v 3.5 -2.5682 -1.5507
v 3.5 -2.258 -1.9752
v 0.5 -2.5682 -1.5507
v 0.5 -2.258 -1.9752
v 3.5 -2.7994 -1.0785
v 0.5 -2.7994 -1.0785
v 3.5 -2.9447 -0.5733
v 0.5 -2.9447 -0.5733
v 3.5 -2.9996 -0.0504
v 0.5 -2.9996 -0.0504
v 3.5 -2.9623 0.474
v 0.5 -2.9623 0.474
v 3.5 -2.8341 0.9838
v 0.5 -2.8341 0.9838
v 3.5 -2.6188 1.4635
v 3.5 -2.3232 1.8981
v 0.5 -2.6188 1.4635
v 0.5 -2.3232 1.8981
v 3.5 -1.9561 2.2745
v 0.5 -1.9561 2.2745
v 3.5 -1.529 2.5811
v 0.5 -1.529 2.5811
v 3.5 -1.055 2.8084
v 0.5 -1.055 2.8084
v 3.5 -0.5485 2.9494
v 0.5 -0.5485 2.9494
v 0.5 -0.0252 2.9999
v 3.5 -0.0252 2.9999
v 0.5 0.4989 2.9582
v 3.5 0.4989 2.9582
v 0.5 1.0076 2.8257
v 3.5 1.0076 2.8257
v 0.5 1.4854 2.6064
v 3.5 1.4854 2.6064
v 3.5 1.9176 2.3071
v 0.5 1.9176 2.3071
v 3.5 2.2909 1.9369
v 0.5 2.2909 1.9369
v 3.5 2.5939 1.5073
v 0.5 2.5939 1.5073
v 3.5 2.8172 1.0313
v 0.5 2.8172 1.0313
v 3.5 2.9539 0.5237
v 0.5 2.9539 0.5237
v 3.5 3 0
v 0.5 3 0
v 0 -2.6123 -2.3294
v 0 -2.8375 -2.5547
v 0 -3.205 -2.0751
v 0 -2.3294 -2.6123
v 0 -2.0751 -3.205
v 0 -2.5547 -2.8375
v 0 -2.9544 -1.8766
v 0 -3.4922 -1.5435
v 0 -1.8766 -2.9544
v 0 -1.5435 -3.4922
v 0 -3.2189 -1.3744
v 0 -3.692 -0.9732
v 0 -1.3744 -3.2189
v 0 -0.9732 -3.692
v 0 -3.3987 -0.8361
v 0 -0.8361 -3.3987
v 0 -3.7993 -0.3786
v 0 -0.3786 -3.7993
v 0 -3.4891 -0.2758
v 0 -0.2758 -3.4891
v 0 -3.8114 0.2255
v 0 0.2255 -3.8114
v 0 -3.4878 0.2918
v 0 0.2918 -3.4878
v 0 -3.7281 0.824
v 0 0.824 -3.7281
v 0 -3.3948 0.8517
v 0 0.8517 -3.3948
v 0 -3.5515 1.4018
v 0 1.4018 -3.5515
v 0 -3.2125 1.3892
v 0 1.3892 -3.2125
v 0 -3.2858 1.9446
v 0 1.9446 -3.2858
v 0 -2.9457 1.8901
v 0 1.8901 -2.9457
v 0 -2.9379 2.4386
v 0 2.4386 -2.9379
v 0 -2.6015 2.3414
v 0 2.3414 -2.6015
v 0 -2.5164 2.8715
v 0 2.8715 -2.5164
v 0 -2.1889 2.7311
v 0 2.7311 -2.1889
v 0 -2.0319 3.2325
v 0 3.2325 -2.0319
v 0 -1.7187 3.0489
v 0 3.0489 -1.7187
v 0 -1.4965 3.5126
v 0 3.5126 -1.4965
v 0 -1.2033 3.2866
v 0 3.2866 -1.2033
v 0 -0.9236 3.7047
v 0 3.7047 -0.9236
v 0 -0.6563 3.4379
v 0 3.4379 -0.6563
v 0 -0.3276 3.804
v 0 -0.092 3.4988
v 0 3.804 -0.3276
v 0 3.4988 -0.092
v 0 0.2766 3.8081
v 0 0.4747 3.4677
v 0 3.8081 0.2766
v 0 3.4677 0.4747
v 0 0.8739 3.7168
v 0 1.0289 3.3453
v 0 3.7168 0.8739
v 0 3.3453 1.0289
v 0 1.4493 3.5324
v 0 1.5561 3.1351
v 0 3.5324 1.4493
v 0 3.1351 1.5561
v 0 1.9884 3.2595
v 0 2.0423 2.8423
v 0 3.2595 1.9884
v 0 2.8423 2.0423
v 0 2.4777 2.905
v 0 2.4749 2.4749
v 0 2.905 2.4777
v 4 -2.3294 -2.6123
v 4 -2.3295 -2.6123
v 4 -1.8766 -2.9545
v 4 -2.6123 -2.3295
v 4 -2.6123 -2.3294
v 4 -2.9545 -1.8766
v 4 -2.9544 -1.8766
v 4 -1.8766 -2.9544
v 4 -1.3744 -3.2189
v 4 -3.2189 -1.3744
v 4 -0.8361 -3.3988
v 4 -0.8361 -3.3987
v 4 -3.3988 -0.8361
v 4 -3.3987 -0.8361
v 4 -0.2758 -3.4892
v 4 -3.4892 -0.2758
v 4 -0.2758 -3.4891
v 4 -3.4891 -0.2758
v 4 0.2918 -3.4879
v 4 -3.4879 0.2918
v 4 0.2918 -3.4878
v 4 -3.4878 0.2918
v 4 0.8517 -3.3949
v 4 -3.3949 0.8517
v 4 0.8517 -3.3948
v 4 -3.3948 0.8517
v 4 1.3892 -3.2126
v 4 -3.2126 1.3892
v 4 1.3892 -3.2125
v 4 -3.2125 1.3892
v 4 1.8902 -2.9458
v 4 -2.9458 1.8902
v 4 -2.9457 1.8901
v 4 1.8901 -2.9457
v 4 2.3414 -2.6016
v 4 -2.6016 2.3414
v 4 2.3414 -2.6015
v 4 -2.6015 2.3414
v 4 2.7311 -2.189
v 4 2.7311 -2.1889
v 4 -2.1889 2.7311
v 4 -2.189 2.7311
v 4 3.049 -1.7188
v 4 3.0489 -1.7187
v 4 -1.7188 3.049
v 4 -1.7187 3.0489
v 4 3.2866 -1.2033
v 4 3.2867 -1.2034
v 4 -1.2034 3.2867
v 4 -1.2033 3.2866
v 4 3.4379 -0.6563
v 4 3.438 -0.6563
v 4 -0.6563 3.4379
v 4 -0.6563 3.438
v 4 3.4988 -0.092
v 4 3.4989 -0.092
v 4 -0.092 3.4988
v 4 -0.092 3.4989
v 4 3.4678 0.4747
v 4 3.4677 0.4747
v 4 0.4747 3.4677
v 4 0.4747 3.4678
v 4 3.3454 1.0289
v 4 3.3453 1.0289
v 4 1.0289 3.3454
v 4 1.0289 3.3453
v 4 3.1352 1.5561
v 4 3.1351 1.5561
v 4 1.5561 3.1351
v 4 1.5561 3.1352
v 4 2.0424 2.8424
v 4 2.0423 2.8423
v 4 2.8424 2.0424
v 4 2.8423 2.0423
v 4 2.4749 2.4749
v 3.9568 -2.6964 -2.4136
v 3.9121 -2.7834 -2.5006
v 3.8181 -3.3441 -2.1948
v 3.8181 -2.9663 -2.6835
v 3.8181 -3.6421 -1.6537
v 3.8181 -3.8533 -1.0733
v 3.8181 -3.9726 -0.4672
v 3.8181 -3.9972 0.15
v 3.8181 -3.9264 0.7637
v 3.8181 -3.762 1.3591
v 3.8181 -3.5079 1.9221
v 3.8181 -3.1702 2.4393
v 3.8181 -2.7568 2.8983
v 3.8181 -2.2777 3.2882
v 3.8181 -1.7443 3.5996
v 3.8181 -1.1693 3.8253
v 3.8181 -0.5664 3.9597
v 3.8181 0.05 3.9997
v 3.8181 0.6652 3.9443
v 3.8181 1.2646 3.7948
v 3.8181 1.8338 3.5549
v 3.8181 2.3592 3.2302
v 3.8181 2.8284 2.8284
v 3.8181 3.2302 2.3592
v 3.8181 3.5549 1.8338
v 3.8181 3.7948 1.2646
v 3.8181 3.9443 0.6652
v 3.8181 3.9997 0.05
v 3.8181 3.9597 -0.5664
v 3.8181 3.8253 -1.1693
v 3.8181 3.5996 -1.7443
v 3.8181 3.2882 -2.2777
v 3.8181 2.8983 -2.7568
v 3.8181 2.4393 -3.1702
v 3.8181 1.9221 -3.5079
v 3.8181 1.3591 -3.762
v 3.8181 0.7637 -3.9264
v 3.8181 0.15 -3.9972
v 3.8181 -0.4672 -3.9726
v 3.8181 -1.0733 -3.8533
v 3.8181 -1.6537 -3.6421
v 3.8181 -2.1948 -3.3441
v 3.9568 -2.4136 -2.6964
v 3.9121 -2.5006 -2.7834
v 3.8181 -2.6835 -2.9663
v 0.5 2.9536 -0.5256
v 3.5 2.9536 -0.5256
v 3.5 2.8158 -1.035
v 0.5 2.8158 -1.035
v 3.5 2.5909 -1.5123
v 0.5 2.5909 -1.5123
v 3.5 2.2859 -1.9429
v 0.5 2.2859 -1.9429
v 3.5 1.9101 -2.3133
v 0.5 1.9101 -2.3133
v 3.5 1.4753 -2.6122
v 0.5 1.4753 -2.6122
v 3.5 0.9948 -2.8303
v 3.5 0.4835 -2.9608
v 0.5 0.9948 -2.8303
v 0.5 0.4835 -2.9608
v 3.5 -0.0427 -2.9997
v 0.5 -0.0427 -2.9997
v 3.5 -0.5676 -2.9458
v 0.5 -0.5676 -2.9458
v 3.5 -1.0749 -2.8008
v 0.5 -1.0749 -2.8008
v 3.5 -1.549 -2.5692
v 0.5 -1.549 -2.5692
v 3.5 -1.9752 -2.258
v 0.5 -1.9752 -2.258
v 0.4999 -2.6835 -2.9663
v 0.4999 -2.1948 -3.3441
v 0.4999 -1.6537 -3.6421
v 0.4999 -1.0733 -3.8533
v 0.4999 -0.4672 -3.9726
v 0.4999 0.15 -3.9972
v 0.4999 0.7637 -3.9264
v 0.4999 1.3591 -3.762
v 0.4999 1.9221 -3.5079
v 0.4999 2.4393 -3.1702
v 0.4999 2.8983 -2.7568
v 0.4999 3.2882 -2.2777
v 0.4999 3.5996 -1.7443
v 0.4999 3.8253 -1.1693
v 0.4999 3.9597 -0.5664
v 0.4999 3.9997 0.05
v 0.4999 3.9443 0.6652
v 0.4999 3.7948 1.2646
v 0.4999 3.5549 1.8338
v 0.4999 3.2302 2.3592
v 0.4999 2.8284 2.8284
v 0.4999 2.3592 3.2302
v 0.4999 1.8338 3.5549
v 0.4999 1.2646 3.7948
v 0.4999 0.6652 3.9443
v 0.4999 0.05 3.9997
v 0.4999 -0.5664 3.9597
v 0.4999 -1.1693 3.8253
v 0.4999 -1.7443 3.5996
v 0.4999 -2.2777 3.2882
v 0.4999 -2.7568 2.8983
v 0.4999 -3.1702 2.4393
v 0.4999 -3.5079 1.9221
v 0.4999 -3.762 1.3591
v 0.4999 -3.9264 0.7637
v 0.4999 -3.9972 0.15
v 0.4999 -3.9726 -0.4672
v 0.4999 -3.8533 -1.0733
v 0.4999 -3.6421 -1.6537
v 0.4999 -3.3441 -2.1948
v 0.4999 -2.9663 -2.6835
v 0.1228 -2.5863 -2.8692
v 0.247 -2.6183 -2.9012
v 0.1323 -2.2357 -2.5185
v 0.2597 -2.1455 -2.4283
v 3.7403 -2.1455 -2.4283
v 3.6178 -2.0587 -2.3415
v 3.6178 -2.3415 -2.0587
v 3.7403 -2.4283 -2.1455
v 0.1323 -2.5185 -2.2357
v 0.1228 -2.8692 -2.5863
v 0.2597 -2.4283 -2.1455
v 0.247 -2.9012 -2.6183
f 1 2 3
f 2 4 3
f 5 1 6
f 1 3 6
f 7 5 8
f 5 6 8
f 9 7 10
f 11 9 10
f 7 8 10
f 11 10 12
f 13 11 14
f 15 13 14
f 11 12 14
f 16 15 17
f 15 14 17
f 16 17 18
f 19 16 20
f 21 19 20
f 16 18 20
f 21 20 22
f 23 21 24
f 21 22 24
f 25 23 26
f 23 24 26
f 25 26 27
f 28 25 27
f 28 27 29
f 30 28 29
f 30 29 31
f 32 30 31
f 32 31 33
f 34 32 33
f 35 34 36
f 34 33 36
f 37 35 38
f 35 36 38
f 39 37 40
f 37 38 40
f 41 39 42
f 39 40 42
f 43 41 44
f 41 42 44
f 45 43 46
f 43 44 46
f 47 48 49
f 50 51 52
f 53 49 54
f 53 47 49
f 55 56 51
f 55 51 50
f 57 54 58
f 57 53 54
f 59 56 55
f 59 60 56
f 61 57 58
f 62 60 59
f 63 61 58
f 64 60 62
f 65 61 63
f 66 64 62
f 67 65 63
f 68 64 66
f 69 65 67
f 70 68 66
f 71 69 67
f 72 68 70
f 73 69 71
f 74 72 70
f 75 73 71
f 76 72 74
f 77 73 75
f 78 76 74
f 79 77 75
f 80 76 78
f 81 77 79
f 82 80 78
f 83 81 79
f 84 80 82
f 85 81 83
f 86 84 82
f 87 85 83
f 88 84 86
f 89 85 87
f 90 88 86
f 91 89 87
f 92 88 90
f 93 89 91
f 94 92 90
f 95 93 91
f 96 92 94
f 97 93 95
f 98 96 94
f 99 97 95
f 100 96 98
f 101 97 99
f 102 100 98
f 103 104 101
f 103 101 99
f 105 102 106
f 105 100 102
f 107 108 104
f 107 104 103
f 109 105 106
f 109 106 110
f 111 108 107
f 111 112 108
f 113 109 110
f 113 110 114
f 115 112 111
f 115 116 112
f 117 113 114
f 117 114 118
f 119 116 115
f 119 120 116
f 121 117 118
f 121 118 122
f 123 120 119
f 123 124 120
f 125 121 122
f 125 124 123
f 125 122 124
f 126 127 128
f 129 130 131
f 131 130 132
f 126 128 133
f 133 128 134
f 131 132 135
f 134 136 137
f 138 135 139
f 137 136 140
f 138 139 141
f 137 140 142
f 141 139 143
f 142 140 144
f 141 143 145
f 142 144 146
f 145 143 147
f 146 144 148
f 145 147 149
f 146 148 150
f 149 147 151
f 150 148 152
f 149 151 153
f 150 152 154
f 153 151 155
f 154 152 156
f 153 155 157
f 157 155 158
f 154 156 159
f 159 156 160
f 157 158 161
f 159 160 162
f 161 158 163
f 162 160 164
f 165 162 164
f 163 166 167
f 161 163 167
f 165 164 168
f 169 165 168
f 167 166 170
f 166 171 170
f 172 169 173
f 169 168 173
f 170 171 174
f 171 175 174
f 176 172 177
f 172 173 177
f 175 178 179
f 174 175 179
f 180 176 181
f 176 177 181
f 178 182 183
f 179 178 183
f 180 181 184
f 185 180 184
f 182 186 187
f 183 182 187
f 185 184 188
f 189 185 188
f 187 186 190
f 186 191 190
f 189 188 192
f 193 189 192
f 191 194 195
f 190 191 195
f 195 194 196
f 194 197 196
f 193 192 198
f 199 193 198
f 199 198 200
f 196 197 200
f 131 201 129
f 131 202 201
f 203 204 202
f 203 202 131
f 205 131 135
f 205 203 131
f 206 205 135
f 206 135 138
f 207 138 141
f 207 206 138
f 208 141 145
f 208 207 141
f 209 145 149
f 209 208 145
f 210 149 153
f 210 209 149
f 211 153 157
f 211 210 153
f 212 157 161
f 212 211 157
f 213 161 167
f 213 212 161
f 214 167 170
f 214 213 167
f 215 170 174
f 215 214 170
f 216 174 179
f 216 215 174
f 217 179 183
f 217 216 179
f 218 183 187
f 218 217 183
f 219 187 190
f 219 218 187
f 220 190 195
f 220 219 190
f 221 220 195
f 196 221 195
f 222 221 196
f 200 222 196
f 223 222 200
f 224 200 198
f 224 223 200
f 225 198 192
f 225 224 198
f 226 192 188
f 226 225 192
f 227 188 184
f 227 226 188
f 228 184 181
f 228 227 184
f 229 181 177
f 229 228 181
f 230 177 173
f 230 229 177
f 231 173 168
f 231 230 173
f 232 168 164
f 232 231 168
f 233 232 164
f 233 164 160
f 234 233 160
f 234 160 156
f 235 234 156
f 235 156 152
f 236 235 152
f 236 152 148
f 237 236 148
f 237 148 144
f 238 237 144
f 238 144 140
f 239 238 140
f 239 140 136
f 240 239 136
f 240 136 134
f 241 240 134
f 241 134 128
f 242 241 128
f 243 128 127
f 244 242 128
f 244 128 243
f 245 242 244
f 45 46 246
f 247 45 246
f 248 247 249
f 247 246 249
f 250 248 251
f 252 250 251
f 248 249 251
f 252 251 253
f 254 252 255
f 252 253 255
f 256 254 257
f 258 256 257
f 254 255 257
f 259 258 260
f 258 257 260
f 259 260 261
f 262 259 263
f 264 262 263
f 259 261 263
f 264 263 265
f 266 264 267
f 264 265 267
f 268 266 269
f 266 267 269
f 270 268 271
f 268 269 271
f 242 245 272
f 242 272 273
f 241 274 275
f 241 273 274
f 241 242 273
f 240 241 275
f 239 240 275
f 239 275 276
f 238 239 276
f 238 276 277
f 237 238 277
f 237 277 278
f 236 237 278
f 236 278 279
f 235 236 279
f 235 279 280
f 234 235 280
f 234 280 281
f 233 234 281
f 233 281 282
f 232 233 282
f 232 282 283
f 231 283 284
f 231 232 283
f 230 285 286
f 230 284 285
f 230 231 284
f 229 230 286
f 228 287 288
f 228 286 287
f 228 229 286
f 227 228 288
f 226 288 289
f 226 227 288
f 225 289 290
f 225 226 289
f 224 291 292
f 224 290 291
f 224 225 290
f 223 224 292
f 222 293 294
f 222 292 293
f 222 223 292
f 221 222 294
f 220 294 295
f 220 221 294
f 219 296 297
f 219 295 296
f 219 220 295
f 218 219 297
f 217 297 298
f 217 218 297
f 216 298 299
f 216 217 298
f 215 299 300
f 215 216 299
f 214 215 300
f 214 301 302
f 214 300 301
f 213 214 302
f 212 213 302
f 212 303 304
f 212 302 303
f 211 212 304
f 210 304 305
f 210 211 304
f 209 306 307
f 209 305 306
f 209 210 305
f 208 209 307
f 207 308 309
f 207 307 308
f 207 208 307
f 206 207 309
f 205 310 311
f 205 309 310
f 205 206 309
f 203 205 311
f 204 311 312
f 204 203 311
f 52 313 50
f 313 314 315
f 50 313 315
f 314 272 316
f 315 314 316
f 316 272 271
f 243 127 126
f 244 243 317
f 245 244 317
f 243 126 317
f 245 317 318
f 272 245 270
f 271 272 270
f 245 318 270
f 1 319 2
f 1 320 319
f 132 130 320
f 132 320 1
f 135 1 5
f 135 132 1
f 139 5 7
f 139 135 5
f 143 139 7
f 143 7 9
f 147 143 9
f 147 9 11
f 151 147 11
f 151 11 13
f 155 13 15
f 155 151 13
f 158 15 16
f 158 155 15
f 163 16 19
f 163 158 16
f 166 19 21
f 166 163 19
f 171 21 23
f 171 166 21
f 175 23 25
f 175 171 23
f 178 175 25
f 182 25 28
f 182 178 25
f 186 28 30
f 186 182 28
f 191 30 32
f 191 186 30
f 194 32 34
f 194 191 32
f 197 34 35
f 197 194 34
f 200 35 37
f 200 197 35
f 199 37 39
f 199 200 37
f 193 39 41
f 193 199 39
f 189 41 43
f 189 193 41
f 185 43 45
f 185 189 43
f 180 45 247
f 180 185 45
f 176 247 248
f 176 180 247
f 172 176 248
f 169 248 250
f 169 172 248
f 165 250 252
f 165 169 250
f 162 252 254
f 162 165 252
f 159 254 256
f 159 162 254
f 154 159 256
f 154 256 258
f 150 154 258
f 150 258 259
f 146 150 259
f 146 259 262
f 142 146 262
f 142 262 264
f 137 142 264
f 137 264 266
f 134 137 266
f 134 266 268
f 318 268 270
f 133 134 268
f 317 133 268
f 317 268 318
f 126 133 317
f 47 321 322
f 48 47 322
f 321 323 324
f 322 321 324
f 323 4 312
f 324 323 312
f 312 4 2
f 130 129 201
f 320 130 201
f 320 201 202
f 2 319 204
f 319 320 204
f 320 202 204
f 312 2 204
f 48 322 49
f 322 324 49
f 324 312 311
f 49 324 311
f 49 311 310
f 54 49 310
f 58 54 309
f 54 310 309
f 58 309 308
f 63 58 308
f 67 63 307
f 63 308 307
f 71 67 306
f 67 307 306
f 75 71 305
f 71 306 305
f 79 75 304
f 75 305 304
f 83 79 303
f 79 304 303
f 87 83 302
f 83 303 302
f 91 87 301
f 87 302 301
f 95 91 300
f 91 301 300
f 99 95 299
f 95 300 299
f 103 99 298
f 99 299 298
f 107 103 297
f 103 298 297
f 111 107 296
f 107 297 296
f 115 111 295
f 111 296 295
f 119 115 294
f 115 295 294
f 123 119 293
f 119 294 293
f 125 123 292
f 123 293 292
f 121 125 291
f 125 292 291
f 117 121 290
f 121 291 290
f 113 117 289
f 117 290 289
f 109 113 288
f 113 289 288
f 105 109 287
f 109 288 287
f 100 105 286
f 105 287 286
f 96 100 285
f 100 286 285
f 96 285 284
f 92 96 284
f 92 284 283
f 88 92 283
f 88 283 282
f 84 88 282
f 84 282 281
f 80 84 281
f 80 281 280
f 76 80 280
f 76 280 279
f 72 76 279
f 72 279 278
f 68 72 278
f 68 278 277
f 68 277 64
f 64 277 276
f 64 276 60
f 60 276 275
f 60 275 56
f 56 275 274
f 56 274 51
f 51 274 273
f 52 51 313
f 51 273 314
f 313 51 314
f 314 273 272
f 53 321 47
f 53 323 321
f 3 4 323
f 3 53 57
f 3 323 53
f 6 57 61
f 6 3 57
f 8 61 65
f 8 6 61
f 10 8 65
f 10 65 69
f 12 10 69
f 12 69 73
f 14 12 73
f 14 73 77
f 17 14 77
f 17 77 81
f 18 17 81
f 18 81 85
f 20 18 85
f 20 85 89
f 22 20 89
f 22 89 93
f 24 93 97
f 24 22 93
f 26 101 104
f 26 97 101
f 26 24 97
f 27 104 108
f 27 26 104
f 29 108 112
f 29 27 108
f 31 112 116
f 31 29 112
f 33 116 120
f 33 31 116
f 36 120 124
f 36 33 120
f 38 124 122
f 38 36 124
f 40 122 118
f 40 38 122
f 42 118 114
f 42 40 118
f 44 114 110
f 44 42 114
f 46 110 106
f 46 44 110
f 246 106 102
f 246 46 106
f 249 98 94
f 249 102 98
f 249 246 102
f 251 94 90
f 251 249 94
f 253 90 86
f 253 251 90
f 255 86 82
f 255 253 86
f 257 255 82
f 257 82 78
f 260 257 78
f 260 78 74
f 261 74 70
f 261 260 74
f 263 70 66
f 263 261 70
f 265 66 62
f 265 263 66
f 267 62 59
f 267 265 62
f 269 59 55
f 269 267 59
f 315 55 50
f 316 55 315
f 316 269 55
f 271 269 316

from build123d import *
from OCP.BRepFilletAPI import BRepFilletAPI_MakeChamfer

# Parameters (mm, degrees)
ESQUISSE1_W             = 4
ESQUISSE1_H             = 4
ENL_V_MAT_EXTRU_1_DEPTH = 7.92820323
ESQUISSE3_W             = 4
ESQUISSE3_H             = 3
CHANFREIN1_SIZE         = 0.5
CHANFREIN2_SIZE         = 0.5
CHANFREIN2_SIZE_2       = 0.181985117


with BuildPart() as part:
    # Esquisse1 → Révolution1 (revolve)
    with BuildSketch(Plane.XY, mode=Mode.PRIVATE) as r_volution1_sk:
        with Locations((2, 2)):
            Rectangle(ESQUISSE1_W, ESQUISSE1_H)
    revolve(r_volution1_sk.sketch.rotate(Axis((0, 0, 0), (1, 0, 0)), 270), axis=Axis((0, 0, 0), (1, 0, 0)))

    # Esquisse2 → Enlèv. mat.-Extru.1 (cut, through all)
    with BuildSketch(Plane(origin=(4, 0, 0), x_dir=(0, 0, -1), z_dir=(1, 0, 0))):
        with BuildLine():
            Line((2.966310735, -2.683468022), (2.258022405, -1.975179693))
            ThreePointArc((2.258022405, -1.975179693), (2.121320344, -2.121320344), (1.975179693, -2.258022405))
            Line((1.975179693, -2.258022405), (2.683468022, -2.966310735))
            ThreePointArc((2.683468022, -2.966310735), (2.828427125, -2.828427125), (2.966310735, -2.683468022))
        make_face()
    extrude(amount=-ENL_V_MAT_EXTRU_1_DEPTH, mode=Mode.SUBTRACT)

    # Esquisse3 → Enlèvement de matière-Révolution1 (revolve, cut)
    with BuildSketch(Plane(origin=(0, 0, 0), x_dir=(-1, 0, 0), z_dir=(0, 0, -1))):
        with Locations((-2, 1.5)):
            Rectangle(ESQUISSE3_W, ESQUISSE3_H)
    revolve(axis=Axis((4, 0, 0), (-1, 0, 0)), mode=Mode.SUBTRACT)

    # Chanfrein1
    chanfrein1_edges = [part.edges().sort_by_distance(p)[0] for p in [
        (4, -1.054972224, 2.8083863),
        (0, -1.054972224, 2.8083863),
    ]]
    chamfer(chanfrein1_edges, length=CHANFREIN1_SIZE)

    # Chanfrein2
    chanfrein2_edges_1 = [part.edges().sort_by_distance(p)[0] for p in [
        (4, 2.828427125, 2.828427125),
    ]]
    chanfrein2_side_1 = [part.faces().sort_by_distance(p)[0] for p in [
        (4, 2.825853467, 2.825853467),
    ]]
    chanfrein2_edges_2 = [part.edges().sort_by_distance(p)[0] for p in [
        (0, 2.828427125, 2.828427125),
    ]]
    chanfrein2_side_2 = [part.faces().sort_by_distance(p)[0] for p in [
        (0, 2.825853467, 2.825853467),
    ]]
    chanfrein2 = BRepFilletAPI_MakeChamfer(part.part.solid().wrapped)
    for e in chanfrein2_edges_1:
        chanfrein2.Add(CHANFREIN2_SIZE - 0.0001, CHANFREIN2_SIZE_2 - 0.0001, e.wrapped, chanfrein2_side_1[0].wrapped)
    for e in chanfrein2_edges_2:
        chanfrein2.Add(CHANFREIN2_SIZE_2 - 0.0001, CHANFREIN2_SIZE - 0.0001, e.wrapped, chanfrein2_side_2[0].wrapped)
    add(Compound.cast(chanfrein2.Shape()), mode=Mode.REPLACE)  # a hair under: the kernel refuses the full size


solid = part.part
